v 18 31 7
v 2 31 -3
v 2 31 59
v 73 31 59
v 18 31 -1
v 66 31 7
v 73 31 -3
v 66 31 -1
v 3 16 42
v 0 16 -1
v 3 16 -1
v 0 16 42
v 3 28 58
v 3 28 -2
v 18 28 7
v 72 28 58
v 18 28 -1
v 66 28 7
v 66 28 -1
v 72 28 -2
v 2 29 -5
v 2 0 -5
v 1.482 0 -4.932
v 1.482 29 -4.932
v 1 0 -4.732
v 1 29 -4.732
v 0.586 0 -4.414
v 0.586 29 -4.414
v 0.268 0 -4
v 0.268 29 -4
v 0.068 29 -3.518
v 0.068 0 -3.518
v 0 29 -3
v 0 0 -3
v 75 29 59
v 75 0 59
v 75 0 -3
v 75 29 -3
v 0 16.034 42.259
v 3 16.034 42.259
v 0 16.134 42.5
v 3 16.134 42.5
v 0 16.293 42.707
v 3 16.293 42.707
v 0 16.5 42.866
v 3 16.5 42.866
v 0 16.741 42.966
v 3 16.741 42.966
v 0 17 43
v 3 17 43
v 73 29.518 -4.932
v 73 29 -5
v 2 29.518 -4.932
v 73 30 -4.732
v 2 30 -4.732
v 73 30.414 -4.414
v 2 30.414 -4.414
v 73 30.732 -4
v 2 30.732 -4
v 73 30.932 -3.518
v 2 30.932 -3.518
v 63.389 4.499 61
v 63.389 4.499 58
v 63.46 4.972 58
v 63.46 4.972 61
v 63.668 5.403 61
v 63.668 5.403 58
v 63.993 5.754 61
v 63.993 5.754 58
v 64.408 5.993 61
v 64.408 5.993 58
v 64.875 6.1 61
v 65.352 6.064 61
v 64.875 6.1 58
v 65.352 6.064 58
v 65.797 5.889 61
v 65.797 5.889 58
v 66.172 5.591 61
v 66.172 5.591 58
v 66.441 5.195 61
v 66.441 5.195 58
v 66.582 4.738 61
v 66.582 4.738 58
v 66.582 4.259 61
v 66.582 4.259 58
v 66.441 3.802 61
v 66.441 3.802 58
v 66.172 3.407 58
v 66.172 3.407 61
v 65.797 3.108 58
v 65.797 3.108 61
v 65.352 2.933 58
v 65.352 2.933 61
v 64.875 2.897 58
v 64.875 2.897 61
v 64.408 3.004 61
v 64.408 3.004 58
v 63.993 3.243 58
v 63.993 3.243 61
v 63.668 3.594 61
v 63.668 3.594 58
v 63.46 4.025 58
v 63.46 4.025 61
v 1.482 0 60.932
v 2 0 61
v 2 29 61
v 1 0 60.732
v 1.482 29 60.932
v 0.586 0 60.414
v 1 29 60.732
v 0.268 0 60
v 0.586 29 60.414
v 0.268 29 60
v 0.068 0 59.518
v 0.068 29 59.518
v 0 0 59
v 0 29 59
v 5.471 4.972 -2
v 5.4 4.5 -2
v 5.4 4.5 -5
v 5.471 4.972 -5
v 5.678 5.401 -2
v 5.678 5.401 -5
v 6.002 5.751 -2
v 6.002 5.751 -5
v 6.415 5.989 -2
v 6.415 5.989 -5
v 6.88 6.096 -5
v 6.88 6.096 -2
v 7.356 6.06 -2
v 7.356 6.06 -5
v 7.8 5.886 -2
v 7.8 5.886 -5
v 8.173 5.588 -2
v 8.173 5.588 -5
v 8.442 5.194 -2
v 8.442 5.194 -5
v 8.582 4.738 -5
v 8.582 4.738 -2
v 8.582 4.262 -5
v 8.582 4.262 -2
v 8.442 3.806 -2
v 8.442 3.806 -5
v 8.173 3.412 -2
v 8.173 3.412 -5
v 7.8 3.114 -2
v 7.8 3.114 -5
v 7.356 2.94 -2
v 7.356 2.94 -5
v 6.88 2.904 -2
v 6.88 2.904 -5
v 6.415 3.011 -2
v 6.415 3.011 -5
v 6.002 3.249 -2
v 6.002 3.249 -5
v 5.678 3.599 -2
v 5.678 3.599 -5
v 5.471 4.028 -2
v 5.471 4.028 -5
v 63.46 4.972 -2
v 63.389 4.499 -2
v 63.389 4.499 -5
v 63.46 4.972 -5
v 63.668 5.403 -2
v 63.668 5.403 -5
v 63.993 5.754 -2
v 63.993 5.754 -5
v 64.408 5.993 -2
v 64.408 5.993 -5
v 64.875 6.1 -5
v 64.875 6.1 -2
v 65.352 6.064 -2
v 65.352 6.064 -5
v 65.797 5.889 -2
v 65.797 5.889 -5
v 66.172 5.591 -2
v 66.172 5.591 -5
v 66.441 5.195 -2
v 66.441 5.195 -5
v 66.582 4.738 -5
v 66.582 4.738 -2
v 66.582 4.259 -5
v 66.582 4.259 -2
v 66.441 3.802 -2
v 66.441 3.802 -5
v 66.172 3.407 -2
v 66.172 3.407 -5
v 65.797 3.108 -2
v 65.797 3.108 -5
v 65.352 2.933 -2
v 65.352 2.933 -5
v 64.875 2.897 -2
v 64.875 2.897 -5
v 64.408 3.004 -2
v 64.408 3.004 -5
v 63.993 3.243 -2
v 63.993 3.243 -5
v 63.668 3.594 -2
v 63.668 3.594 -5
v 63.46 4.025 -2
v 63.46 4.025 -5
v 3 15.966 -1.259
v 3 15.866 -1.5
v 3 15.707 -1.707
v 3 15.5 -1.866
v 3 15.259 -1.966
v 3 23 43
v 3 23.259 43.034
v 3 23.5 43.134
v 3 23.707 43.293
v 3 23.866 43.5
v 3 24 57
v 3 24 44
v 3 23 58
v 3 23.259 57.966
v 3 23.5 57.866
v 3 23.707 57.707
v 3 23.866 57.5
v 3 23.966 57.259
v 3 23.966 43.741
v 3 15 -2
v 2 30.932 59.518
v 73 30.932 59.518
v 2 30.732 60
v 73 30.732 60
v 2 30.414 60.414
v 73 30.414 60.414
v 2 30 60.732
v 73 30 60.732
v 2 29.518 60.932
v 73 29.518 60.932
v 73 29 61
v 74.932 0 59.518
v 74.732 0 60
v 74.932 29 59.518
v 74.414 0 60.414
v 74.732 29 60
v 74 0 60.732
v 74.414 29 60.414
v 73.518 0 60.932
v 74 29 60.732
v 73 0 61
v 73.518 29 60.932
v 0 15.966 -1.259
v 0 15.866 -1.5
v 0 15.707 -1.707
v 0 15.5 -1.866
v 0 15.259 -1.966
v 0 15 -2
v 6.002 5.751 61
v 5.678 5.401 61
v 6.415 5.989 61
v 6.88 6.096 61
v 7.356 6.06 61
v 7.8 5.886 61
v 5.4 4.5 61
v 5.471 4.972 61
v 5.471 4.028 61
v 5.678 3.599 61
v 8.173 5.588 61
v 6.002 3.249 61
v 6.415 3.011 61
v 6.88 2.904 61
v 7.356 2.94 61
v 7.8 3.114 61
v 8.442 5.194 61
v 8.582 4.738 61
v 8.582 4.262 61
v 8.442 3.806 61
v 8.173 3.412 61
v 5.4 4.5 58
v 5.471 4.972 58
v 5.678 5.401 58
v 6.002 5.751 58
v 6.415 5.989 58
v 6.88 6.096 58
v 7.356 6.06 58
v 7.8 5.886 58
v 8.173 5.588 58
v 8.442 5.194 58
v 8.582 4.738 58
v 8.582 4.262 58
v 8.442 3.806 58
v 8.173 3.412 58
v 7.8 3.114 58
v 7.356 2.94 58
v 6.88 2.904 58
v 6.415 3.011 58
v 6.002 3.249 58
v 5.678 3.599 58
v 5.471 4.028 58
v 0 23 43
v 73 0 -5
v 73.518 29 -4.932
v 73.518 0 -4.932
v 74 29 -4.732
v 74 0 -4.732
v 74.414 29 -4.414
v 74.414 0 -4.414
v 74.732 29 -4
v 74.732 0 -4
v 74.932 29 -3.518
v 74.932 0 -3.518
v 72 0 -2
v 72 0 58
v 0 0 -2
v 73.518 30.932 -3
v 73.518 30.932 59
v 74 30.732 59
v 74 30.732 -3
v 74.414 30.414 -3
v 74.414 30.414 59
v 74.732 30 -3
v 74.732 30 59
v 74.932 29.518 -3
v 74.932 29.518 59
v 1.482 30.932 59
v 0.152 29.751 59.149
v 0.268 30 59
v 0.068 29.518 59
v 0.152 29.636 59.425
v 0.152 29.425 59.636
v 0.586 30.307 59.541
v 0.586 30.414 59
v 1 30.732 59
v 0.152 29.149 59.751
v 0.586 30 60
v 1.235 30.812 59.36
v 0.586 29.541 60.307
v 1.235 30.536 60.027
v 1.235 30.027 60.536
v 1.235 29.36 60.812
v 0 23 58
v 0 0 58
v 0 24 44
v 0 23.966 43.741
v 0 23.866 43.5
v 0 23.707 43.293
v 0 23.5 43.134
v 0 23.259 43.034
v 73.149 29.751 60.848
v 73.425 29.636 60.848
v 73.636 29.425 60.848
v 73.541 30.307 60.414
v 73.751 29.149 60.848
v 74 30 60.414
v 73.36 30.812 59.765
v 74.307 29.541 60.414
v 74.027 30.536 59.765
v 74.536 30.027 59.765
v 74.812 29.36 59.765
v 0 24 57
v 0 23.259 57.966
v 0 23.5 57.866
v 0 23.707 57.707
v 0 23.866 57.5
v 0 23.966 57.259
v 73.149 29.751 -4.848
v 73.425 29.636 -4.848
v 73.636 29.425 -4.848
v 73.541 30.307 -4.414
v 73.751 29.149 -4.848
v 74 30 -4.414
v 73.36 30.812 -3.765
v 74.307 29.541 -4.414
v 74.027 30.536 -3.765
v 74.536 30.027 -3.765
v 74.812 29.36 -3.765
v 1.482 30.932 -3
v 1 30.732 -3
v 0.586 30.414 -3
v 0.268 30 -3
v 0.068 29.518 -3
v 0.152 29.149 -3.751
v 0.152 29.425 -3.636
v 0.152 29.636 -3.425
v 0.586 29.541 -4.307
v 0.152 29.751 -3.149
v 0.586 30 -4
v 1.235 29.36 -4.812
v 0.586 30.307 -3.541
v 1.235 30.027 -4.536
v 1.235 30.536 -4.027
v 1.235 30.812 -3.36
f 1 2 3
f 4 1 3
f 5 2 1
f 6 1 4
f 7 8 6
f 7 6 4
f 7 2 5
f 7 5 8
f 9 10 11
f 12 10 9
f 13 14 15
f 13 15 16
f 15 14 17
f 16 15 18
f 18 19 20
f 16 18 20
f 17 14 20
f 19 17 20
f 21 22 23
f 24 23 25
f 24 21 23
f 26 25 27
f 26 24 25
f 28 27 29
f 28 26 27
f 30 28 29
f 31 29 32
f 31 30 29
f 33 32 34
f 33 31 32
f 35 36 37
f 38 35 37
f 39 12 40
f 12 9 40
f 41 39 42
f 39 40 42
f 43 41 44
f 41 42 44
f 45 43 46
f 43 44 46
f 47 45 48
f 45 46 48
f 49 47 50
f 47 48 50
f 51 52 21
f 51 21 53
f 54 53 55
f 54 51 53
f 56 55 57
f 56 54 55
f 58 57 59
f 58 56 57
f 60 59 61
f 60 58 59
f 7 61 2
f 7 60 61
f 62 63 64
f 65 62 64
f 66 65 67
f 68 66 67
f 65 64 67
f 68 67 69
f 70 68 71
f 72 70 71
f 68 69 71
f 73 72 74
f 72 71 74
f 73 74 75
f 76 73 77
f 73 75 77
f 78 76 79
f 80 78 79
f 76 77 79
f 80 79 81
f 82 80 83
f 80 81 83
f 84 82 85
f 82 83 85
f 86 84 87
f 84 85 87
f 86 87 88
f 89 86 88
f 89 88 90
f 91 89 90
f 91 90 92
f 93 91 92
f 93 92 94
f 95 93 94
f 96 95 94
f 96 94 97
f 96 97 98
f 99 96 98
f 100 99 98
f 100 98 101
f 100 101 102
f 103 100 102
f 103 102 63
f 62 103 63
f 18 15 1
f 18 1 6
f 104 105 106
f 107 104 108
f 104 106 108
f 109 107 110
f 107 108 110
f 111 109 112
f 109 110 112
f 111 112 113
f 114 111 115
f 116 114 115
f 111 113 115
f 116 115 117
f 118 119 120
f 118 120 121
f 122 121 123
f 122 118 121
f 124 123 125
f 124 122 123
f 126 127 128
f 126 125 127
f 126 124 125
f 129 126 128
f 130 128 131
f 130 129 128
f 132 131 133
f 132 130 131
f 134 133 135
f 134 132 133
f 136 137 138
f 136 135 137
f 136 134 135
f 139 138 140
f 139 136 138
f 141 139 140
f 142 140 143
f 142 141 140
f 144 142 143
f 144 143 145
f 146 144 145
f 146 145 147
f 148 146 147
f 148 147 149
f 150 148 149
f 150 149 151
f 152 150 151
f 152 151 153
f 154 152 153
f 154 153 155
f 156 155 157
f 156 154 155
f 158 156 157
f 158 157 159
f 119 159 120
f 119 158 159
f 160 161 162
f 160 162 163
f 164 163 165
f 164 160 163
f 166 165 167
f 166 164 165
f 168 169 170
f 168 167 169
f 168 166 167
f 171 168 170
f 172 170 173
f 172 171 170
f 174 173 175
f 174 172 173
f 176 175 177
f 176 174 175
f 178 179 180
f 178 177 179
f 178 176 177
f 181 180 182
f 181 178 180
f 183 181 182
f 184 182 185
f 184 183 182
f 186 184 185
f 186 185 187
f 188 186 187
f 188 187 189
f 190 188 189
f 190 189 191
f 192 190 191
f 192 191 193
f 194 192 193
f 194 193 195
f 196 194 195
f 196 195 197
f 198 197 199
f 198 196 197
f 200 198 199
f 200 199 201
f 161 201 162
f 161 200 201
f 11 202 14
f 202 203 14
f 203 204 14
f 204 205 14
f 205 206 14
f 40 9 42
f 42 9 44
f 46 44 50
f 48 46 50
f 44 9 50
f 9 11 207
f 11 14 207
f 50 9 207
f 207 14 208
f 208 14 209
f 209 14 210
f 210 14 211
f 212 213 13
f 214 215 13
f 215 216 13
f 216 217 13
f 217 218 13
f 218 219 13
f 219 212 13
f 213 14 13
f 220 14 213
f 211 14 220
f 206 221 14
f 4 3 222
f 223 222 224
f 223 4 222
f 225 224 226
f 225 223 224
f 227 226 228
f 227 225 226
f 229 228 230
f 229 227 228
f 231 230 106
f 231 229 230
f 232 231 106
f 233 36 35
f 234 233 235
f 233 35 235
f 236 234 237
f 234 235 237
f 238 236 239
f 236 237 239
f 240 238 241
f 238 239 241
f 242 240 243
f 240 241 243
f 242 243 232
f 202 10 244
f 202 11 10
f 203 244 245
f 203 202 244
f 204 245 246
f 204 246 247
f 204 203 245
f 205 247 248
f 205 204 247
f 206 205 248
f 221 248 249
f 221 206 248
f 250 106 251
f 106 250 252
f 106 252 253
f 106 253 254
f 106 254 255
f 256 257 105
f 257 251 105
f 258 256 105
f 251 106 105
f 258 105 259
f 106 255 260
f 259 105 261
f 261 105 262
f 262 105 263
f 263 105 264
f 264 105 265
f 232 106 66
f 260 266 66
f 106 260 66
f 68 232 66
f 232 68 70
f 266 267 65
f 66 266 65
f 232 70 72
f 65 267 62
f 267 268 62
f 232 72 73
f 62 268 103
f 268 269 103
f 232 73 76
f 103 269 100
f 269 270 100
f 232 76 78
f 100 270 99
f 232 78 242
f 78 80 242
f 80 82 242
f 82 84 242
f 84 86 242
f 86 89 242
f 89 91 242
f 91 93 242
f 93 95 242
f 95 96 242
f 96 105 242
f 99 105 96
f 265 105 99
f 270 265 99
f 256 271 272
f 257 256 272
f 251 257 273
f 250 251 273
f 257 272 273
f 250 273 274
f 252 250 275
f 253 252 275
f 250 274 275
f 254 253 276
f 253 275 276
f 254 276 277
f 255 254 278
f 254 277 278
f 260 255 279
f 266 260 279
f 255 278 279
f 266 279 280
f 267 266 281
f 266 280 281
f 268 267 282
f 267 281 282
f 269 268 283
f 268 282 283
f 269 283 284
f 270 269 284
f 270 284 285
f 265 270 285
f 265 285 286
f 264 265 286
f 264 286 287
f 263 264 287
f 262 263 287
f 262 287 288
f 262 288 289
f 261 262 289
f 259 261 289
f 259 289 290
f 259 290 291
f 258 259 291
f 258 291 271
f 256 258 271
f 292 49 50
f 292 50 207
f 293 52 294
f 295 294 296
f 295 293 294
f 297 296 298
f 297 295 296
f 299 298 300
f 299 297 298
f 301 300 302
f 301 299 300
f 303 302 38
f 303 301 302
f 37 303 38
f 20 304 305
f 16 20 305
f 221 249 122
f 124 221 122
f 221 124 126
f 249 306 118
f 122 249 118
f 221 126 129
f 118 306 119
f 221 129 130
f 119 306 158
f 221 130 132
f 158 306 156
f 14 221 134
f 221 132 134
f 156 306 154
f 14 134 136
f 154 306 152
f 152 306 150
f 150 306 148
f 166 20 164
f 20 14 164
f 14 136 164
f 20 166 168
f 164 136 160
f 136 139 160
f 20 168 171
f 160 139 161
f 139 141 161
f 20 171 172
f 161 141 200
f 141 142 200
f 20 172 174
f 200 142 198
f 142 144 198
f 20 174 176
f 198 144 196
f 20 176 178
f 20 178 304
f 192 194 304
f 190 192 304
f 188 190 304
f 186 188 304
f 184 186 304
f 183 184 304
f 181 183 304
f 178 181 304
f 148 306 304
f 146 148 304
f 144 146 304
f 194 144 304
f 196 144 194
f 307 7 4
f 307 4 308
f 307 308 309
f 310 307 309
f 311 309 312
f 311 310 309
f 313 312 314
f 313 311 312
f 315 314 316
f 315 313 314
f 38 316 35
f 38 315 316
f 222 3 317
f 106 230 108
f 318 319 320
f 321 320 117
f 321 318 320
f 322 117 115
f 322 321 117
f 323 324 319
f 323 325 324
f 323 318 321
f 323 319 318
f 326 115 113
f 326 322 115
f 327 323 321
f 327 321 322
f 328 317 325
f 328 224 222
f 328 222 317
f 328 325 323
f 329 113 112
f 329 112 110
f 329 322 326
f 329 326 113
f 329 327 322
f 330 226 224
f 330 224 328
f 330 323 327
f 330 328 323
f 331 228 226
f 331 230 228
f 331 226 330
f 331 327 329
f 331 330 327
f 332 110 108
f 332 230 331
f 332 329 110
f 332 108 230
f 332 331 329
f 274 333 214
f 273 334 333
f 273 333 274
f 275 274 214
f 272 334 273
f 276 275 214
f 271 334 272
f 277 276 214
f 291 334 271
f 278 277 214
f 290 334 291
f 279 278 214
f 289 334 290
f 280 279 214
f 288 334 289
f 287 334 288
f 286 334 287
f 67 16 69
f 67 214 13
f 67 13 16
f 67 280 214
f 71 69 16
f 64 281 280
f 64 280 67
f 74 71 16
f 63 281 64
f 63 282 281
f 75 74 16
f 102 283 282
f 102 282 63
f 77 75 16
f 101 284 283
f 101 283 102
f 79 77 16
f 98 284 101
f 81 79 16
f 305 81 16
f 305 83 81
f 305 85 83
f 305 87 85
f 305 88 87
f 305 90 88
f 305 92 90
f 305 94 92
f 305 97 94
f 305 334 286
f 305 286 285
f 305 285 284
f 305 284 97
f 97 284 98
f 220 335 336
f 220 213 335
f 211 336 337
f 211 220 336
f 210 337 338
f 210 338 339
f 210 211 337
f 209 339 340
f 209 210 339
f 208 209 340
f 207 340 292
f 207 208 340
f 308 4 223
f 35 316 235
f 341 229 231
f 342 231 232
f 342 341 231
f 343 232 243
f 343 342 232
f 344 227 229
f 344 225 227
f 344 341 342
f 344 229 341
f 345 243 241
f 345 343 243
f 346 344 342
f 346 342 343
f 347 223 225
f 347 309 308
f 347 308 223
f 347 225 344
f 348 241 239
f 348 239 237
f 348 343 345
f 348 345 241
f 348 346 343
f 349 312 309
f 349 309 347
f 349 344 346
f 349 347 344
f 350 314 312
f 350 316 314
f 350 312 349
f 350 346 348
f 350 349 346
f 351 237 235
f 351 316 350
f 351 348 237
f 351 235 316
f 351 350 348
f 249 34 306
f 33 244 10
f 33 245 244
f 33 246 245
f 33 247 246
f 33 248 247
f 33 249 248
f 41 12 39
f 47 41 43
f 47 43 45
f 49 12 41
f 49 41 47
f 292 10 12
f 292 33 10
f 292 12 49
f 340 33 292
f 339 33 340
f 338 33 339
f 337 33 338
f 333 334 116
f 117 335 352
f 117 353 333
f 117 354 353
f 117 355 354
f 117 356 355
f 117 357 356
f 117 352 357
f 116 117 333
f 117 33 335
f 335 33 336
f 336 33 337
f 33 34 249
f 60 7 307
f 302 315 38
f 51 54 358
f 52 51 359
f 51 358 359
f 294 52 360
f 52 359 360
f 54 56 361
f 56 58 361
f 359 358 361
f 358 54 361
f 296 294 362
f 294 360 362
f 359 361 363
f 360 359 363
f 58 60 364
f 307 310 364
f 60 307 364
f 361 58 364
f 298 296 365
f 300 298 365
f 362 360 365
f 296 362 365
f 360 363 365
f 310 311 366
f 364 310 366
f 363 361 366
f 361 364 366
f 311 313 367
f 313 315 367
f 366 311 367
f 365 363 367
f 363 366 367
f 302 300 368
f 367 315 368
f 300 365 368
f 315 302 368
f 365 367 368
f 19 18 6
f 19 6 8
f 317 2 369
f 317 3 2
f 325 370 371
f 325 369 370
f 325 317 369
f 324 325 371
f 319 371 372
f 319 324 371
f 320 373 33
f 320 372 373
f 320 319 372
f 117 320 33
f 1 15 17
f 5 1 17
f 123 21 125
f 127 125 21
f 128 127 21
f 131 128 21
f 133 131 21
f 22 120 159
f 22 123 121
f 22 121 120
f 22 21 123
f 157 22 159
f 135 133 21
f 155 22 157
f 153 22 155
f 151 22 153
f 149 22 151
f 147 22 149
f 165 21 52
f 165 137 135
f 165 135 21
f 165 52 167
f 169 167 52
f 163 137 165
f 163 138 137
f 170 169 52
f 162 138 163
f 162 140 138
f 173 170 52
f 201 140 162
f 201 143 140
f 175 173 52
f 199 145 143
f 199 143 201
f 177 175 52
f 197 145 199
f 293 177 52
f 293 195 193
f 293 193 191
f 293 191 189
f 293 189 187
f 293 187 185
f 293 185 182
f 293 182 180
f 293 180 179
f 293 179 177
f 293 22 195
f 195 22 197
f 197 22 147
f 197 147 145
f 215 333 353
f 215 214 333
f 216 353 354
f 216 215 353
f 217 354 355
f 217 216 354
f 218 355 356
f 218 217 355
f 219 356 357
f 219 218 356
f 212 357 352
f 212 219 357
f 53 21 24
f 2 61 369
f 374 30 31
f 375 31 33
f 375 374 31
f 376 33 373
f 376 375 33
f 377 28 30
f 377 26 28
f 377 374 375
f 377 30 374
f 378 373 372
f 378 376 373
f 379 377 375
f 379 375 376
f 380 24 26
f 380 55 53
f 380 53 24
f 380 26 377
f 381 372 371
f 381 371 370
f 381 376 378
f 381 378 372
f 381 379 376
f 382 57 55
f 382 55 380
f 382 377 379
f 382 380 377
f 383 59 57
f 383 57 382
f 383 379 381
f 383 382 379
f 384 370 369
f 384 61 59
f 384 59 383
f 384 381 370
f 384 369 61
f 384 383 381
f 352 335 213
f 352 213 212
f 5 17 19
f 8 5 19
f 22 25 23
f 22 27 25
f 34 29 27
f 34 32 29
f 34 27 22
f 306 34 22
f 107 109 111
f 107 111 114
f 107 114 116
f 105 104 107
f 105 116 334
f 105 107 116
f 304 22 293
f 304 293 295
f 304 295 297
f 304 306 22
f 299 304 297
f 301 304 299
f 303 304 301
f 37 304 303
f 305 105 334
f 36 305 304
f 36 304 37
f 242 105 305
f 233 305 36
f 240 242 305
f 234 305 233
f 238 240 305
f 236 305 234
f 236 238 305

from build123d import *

# Parameters (mm, degrees)
SKETCH1_W               = 78
SKETCH1_H               = 66
SKETCH1_W_2             = 72
SKETCH1_H_2             = 60
BOSS_EXTRUDE1_DEPTH     = 28
SKETCH2_W               = 78
SKETCH2_H               = 66
SKETCH2_W_2             = 48
SKETCH2_H_2             = 8
BOSS_EXTRUDE2_DEPTH     = 3
SKETCH3_W               = 66
SKETCH3_H               = 31
CUT_EXTRUDE1_DEPTH      = 3
SKETCH5_W               = 60
SKETCH5_H               = 4
BOSS_EXTRUDE4_DEPTH     = 3
SKETCH5_4_W             = 45
SKETCH5_4_H             = 8
BOSS_EXTRUDE5_DEPTH     = 3
FILLET1_R               = 1
FILLET2_R               = 2
SKETCH6_R               = 1.605618252
SKETCH6_R_2             = 1.6
CUT_EXTRUDE2_DEPTH      = 17
CUT_EXTRUDE4_DEPTH      = 103
CUT_EXTRUDE4_DEPTH_BACK = 17
SKETCH6_3_R             = 1.605618252
SKETCH6_3_R_2           = 1.6


with BuildPart() as part:
    # Sketch1 → Boss-Extrude1 (new body)
    with BuildSketch(Plane.XZ):
        with Locations((36, 28)):
            Rectangle(SKETCH1_W, SKETCH1_H)
        with Locations((36, 28)):
            Rectangle(SKETCH1_W_2, SKETCH1_H_2, mode=Mode.SUBTRACT)
    extrude(amount=-BOSS_EXTRUDE1_DEPTH)

    # Sketch2 → Boss-Extrude2 (add)
    with BuildSketch(Plane(origin=(0, 28, 0), x_dir=(1, 0, 0), z_dir=(0, 1, 0))):
        with Locations((36, -28)):
            Rectangle(SKETCH2_W, SKETCH2_H)
        with Locations((42, -3)):
            Rectangle(SKETCH2_W_2, SKETCH2_H_2, mode=Mode.SUBTRACT)
    extrude(amount=BOSS_EXTRUDE2_DEPTH)

    # Sketch3 → Cut-Extrude1 (cut)
    with BuildSketch(Plane.ZY.offset(3)):
        with Locations((28, 15.5)):
            Rectangle(SKETCH3_W, SKETCH3_H)
    extrude(amount=-CUT_EXTRUDE1_DEPTH, mode=Mode.SUBTRACT)

    # Sketch5 → Boss-Extrude4 (add)
    with BuildSketch(Plane.ZY):
        with Locations((28, 26)):
            Rectangle(SKETCH5_W, SKETCH5_H)
    extrude(amount=-BOSS_EXTRUDE4_DEPTH)

    # Sketch5<4> → Boss-Extrude5 (add)
    with BuildSketch(Plane.ZY):
        with Locations((20.5, 20)):
            Rectangle(SKETCH5_4_W, SKETCH5_4_H)
    extrude(amount=-BOSS_EXTRUDE5_DEPTH)

    # Fillet1
    fillet1_edges = [part.edges().sort_by_distance(p)[0] for p in [
        (1.5, 16, -2),
        (1.5, 16, 43),
        (1.5, 24, 43),
        (1.5, 24, 58),
    ]]
    fillet(fillet1_edges, radius=FILLET1_R)

    # Fillet2
    fillet2_edges = [part.edges().sort_by_distance(p)[0] for p in [
        (0, 15.5, 61),
        (37.5, 31, 61),
        (75, 15.5, 61),
        (75, 31, 28),
        (0, 31, 28),
        (0, 15.5, -5),
        (37.5, 31, -5),
        (75, 15.5, -5),
    ]]
    fillet(fillet2_edges, radius=FILLET2_R)

    # Sketch6 → Cut-Extrude2 (cut)
    with BuildSketch(Plane(origin=(0, 0, 58), x_dir=(-1, 0, 0), z_dir=(0, 0, -1))):
        with Locations((-64.99455474, 4.498616562)):
            Circle(SKETCH6_R)
        with Locations((-7, 4.5)):
            Circle(SKETCH6_R_2)
    extrude(amount=-CUT_EXTRUDE2_DEPTH, mode=Mode.SUBTRACT)

    # Sketch6<3> → Cut-Extrude4 (cut, two sides: drawn at the far end of the back side and taken through both)
    with BuildSketch(Plane(origin=(0, 0, 58), x_dir=(-1, 0, 0), z_dir=(0, 0, -1)).offset(-CUT_EXTRUDE4_DEPTH_BACK)):
        with Locations((-64.99455474, 4.498616562)):
            Circle(SKETCH6_3_R)
        with Locations((-7, 4.5)):
            Circle(SKETCH6_3_R_2)
    extrude(amount=CUT_EXTRUDE4_DEPTH + CUT_EXTRUDE4_DEPTH_BACK, mode=Mode.SUBTRACT)


solid = part.part
